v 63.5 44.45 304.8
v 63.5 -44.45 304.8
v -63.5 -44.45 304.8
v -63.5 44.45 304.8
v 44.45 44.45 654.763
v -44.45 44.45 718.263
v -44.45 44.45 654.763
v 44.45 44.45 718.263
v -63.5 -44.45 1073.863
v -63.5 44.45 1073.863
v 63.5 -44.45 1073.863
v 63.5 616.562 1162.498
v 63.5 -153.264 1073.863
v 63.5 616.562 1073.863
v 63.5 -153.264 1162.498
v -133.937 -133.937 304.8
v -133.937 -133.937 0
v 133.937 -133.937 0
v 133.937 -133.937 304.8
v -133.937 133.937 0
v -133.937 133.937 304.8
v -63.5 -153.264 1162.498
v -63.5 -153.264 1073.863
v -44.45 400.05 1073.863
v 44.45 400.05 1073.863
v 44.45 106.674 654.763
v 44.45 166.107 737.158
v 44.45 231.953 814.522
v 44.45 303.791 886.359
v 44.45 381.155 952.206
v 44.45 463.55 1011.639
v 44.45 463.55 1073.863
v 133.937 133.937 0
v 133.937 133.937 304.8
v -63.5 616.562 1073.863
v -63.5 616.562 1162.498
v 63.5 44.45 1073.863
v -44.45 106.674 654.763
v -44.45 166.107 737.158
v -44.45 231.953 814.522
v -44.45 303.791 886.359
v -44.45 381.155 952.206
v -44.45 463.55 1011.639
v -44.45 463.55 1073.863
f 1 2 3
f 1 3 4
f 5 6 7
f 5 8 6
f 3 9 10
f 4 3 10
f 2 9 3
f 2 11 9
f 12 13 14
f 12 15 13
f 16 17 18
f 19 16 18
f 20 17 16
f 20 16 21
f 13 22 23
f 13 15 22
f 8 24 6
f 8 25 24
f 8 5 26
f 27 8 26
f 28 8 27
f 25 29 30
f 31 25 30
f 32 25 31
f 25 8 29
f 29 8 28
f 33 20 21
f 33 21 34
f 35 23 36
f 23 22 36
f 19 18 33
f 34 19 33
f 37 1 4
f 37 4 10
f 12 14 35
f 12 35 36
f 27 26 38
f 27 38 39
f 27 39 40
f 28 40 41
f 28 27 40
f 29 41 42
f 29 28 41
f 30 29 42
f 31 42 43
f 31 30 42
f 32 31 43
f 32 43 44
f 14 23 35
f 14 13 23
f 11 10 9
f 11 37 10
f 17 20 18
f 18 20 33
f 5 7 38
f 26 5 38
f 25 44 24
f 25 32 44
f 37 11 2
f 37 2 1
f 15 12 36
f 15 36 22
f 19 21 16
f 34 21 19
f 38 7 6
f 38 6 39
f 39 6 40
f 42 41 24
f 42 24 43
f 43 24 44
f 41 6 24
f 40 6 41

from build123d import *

# Parameters (mm, degrees)
F1_W          = 267.8742408752
F1_H          = 267.8742408752
F2_DEPTH      = 304.8
F3_DEPTH      = 63.5
F4_DEPTH      = 63.5
F4_DEPTH_BACK = 63.5
F5_DEPTH      = 44.45


with BuildPart() as f2:
    # F1 (on Top) → F2 (new body, through all)
    with BuildSketch(Plane.XY):
        Rectangle(F1_W, F1_H)
    extrude(amount=F2_DEPTH)


with BuildPart() as f3:
    # F0 (on Right) → F3 (new body, symmetric)
    with BuildSketch(Plane.YZ):
        Polygon((-44.45, 1073.8629251003), (-44.45, 304.8), (44.45, 304.8), (44.45, 654.7629251003), (44.45, 718.2629251003), (44.45, 1073.8629251003), align=None)
    extrude(amount=F3_DEPTH, both=True)


with BuildPart() as f4:
    # F0 (on Right) → F4 (new body, two sides)
    with BuildSketch(Plane.YZ) as f4_sk:
        Polygon((-153.2636582851, 1073.8629251003), (-44.45, 1073.8629251003), (44.45, 1073.8629251003), (400.05, 1073.8629251003), (463.55, 1073.8629251003), (616.5617704391, 1073.8629251003), (616.5617704391, 1162.4975204468), (-153.2636582851, 1162.4975204468), align=None)
    extrude(amount=F4_DEPTH)
    extrude(f4_sk.sketch, amount=-F4_DEPTH_BACK)


with BuildPart() as f5:
    # F0 (on Right) → F5 (new body, symmetric)
    with BuildSketch(Plane.YZ):
        with BuildLine():
            Line((44.45, 718.2629251003), (44.45, 654.7629251003))
            Line((44.45, 654.7629251003), (106.673585695, 654.7629251003))
            ThreePointArc((106.673585695, 654.7629251003), (267.1512806053, 851.161644495), (463.55, 1011.6393394054))
            Line((463.55, 1011.6393394054), (463.55, 1073.8629251003))
            Line((463.55, 1073.8629251003), (400.05, 1073.8629251003))
            Line((400.05, 1073.8629251003), (44.45, 718.2629251003))
        make_face()
    extrude(amount=F5_DEPTH, both=True)


solid = Compound([f2.part, f3.part, f4.part, f5.part])
